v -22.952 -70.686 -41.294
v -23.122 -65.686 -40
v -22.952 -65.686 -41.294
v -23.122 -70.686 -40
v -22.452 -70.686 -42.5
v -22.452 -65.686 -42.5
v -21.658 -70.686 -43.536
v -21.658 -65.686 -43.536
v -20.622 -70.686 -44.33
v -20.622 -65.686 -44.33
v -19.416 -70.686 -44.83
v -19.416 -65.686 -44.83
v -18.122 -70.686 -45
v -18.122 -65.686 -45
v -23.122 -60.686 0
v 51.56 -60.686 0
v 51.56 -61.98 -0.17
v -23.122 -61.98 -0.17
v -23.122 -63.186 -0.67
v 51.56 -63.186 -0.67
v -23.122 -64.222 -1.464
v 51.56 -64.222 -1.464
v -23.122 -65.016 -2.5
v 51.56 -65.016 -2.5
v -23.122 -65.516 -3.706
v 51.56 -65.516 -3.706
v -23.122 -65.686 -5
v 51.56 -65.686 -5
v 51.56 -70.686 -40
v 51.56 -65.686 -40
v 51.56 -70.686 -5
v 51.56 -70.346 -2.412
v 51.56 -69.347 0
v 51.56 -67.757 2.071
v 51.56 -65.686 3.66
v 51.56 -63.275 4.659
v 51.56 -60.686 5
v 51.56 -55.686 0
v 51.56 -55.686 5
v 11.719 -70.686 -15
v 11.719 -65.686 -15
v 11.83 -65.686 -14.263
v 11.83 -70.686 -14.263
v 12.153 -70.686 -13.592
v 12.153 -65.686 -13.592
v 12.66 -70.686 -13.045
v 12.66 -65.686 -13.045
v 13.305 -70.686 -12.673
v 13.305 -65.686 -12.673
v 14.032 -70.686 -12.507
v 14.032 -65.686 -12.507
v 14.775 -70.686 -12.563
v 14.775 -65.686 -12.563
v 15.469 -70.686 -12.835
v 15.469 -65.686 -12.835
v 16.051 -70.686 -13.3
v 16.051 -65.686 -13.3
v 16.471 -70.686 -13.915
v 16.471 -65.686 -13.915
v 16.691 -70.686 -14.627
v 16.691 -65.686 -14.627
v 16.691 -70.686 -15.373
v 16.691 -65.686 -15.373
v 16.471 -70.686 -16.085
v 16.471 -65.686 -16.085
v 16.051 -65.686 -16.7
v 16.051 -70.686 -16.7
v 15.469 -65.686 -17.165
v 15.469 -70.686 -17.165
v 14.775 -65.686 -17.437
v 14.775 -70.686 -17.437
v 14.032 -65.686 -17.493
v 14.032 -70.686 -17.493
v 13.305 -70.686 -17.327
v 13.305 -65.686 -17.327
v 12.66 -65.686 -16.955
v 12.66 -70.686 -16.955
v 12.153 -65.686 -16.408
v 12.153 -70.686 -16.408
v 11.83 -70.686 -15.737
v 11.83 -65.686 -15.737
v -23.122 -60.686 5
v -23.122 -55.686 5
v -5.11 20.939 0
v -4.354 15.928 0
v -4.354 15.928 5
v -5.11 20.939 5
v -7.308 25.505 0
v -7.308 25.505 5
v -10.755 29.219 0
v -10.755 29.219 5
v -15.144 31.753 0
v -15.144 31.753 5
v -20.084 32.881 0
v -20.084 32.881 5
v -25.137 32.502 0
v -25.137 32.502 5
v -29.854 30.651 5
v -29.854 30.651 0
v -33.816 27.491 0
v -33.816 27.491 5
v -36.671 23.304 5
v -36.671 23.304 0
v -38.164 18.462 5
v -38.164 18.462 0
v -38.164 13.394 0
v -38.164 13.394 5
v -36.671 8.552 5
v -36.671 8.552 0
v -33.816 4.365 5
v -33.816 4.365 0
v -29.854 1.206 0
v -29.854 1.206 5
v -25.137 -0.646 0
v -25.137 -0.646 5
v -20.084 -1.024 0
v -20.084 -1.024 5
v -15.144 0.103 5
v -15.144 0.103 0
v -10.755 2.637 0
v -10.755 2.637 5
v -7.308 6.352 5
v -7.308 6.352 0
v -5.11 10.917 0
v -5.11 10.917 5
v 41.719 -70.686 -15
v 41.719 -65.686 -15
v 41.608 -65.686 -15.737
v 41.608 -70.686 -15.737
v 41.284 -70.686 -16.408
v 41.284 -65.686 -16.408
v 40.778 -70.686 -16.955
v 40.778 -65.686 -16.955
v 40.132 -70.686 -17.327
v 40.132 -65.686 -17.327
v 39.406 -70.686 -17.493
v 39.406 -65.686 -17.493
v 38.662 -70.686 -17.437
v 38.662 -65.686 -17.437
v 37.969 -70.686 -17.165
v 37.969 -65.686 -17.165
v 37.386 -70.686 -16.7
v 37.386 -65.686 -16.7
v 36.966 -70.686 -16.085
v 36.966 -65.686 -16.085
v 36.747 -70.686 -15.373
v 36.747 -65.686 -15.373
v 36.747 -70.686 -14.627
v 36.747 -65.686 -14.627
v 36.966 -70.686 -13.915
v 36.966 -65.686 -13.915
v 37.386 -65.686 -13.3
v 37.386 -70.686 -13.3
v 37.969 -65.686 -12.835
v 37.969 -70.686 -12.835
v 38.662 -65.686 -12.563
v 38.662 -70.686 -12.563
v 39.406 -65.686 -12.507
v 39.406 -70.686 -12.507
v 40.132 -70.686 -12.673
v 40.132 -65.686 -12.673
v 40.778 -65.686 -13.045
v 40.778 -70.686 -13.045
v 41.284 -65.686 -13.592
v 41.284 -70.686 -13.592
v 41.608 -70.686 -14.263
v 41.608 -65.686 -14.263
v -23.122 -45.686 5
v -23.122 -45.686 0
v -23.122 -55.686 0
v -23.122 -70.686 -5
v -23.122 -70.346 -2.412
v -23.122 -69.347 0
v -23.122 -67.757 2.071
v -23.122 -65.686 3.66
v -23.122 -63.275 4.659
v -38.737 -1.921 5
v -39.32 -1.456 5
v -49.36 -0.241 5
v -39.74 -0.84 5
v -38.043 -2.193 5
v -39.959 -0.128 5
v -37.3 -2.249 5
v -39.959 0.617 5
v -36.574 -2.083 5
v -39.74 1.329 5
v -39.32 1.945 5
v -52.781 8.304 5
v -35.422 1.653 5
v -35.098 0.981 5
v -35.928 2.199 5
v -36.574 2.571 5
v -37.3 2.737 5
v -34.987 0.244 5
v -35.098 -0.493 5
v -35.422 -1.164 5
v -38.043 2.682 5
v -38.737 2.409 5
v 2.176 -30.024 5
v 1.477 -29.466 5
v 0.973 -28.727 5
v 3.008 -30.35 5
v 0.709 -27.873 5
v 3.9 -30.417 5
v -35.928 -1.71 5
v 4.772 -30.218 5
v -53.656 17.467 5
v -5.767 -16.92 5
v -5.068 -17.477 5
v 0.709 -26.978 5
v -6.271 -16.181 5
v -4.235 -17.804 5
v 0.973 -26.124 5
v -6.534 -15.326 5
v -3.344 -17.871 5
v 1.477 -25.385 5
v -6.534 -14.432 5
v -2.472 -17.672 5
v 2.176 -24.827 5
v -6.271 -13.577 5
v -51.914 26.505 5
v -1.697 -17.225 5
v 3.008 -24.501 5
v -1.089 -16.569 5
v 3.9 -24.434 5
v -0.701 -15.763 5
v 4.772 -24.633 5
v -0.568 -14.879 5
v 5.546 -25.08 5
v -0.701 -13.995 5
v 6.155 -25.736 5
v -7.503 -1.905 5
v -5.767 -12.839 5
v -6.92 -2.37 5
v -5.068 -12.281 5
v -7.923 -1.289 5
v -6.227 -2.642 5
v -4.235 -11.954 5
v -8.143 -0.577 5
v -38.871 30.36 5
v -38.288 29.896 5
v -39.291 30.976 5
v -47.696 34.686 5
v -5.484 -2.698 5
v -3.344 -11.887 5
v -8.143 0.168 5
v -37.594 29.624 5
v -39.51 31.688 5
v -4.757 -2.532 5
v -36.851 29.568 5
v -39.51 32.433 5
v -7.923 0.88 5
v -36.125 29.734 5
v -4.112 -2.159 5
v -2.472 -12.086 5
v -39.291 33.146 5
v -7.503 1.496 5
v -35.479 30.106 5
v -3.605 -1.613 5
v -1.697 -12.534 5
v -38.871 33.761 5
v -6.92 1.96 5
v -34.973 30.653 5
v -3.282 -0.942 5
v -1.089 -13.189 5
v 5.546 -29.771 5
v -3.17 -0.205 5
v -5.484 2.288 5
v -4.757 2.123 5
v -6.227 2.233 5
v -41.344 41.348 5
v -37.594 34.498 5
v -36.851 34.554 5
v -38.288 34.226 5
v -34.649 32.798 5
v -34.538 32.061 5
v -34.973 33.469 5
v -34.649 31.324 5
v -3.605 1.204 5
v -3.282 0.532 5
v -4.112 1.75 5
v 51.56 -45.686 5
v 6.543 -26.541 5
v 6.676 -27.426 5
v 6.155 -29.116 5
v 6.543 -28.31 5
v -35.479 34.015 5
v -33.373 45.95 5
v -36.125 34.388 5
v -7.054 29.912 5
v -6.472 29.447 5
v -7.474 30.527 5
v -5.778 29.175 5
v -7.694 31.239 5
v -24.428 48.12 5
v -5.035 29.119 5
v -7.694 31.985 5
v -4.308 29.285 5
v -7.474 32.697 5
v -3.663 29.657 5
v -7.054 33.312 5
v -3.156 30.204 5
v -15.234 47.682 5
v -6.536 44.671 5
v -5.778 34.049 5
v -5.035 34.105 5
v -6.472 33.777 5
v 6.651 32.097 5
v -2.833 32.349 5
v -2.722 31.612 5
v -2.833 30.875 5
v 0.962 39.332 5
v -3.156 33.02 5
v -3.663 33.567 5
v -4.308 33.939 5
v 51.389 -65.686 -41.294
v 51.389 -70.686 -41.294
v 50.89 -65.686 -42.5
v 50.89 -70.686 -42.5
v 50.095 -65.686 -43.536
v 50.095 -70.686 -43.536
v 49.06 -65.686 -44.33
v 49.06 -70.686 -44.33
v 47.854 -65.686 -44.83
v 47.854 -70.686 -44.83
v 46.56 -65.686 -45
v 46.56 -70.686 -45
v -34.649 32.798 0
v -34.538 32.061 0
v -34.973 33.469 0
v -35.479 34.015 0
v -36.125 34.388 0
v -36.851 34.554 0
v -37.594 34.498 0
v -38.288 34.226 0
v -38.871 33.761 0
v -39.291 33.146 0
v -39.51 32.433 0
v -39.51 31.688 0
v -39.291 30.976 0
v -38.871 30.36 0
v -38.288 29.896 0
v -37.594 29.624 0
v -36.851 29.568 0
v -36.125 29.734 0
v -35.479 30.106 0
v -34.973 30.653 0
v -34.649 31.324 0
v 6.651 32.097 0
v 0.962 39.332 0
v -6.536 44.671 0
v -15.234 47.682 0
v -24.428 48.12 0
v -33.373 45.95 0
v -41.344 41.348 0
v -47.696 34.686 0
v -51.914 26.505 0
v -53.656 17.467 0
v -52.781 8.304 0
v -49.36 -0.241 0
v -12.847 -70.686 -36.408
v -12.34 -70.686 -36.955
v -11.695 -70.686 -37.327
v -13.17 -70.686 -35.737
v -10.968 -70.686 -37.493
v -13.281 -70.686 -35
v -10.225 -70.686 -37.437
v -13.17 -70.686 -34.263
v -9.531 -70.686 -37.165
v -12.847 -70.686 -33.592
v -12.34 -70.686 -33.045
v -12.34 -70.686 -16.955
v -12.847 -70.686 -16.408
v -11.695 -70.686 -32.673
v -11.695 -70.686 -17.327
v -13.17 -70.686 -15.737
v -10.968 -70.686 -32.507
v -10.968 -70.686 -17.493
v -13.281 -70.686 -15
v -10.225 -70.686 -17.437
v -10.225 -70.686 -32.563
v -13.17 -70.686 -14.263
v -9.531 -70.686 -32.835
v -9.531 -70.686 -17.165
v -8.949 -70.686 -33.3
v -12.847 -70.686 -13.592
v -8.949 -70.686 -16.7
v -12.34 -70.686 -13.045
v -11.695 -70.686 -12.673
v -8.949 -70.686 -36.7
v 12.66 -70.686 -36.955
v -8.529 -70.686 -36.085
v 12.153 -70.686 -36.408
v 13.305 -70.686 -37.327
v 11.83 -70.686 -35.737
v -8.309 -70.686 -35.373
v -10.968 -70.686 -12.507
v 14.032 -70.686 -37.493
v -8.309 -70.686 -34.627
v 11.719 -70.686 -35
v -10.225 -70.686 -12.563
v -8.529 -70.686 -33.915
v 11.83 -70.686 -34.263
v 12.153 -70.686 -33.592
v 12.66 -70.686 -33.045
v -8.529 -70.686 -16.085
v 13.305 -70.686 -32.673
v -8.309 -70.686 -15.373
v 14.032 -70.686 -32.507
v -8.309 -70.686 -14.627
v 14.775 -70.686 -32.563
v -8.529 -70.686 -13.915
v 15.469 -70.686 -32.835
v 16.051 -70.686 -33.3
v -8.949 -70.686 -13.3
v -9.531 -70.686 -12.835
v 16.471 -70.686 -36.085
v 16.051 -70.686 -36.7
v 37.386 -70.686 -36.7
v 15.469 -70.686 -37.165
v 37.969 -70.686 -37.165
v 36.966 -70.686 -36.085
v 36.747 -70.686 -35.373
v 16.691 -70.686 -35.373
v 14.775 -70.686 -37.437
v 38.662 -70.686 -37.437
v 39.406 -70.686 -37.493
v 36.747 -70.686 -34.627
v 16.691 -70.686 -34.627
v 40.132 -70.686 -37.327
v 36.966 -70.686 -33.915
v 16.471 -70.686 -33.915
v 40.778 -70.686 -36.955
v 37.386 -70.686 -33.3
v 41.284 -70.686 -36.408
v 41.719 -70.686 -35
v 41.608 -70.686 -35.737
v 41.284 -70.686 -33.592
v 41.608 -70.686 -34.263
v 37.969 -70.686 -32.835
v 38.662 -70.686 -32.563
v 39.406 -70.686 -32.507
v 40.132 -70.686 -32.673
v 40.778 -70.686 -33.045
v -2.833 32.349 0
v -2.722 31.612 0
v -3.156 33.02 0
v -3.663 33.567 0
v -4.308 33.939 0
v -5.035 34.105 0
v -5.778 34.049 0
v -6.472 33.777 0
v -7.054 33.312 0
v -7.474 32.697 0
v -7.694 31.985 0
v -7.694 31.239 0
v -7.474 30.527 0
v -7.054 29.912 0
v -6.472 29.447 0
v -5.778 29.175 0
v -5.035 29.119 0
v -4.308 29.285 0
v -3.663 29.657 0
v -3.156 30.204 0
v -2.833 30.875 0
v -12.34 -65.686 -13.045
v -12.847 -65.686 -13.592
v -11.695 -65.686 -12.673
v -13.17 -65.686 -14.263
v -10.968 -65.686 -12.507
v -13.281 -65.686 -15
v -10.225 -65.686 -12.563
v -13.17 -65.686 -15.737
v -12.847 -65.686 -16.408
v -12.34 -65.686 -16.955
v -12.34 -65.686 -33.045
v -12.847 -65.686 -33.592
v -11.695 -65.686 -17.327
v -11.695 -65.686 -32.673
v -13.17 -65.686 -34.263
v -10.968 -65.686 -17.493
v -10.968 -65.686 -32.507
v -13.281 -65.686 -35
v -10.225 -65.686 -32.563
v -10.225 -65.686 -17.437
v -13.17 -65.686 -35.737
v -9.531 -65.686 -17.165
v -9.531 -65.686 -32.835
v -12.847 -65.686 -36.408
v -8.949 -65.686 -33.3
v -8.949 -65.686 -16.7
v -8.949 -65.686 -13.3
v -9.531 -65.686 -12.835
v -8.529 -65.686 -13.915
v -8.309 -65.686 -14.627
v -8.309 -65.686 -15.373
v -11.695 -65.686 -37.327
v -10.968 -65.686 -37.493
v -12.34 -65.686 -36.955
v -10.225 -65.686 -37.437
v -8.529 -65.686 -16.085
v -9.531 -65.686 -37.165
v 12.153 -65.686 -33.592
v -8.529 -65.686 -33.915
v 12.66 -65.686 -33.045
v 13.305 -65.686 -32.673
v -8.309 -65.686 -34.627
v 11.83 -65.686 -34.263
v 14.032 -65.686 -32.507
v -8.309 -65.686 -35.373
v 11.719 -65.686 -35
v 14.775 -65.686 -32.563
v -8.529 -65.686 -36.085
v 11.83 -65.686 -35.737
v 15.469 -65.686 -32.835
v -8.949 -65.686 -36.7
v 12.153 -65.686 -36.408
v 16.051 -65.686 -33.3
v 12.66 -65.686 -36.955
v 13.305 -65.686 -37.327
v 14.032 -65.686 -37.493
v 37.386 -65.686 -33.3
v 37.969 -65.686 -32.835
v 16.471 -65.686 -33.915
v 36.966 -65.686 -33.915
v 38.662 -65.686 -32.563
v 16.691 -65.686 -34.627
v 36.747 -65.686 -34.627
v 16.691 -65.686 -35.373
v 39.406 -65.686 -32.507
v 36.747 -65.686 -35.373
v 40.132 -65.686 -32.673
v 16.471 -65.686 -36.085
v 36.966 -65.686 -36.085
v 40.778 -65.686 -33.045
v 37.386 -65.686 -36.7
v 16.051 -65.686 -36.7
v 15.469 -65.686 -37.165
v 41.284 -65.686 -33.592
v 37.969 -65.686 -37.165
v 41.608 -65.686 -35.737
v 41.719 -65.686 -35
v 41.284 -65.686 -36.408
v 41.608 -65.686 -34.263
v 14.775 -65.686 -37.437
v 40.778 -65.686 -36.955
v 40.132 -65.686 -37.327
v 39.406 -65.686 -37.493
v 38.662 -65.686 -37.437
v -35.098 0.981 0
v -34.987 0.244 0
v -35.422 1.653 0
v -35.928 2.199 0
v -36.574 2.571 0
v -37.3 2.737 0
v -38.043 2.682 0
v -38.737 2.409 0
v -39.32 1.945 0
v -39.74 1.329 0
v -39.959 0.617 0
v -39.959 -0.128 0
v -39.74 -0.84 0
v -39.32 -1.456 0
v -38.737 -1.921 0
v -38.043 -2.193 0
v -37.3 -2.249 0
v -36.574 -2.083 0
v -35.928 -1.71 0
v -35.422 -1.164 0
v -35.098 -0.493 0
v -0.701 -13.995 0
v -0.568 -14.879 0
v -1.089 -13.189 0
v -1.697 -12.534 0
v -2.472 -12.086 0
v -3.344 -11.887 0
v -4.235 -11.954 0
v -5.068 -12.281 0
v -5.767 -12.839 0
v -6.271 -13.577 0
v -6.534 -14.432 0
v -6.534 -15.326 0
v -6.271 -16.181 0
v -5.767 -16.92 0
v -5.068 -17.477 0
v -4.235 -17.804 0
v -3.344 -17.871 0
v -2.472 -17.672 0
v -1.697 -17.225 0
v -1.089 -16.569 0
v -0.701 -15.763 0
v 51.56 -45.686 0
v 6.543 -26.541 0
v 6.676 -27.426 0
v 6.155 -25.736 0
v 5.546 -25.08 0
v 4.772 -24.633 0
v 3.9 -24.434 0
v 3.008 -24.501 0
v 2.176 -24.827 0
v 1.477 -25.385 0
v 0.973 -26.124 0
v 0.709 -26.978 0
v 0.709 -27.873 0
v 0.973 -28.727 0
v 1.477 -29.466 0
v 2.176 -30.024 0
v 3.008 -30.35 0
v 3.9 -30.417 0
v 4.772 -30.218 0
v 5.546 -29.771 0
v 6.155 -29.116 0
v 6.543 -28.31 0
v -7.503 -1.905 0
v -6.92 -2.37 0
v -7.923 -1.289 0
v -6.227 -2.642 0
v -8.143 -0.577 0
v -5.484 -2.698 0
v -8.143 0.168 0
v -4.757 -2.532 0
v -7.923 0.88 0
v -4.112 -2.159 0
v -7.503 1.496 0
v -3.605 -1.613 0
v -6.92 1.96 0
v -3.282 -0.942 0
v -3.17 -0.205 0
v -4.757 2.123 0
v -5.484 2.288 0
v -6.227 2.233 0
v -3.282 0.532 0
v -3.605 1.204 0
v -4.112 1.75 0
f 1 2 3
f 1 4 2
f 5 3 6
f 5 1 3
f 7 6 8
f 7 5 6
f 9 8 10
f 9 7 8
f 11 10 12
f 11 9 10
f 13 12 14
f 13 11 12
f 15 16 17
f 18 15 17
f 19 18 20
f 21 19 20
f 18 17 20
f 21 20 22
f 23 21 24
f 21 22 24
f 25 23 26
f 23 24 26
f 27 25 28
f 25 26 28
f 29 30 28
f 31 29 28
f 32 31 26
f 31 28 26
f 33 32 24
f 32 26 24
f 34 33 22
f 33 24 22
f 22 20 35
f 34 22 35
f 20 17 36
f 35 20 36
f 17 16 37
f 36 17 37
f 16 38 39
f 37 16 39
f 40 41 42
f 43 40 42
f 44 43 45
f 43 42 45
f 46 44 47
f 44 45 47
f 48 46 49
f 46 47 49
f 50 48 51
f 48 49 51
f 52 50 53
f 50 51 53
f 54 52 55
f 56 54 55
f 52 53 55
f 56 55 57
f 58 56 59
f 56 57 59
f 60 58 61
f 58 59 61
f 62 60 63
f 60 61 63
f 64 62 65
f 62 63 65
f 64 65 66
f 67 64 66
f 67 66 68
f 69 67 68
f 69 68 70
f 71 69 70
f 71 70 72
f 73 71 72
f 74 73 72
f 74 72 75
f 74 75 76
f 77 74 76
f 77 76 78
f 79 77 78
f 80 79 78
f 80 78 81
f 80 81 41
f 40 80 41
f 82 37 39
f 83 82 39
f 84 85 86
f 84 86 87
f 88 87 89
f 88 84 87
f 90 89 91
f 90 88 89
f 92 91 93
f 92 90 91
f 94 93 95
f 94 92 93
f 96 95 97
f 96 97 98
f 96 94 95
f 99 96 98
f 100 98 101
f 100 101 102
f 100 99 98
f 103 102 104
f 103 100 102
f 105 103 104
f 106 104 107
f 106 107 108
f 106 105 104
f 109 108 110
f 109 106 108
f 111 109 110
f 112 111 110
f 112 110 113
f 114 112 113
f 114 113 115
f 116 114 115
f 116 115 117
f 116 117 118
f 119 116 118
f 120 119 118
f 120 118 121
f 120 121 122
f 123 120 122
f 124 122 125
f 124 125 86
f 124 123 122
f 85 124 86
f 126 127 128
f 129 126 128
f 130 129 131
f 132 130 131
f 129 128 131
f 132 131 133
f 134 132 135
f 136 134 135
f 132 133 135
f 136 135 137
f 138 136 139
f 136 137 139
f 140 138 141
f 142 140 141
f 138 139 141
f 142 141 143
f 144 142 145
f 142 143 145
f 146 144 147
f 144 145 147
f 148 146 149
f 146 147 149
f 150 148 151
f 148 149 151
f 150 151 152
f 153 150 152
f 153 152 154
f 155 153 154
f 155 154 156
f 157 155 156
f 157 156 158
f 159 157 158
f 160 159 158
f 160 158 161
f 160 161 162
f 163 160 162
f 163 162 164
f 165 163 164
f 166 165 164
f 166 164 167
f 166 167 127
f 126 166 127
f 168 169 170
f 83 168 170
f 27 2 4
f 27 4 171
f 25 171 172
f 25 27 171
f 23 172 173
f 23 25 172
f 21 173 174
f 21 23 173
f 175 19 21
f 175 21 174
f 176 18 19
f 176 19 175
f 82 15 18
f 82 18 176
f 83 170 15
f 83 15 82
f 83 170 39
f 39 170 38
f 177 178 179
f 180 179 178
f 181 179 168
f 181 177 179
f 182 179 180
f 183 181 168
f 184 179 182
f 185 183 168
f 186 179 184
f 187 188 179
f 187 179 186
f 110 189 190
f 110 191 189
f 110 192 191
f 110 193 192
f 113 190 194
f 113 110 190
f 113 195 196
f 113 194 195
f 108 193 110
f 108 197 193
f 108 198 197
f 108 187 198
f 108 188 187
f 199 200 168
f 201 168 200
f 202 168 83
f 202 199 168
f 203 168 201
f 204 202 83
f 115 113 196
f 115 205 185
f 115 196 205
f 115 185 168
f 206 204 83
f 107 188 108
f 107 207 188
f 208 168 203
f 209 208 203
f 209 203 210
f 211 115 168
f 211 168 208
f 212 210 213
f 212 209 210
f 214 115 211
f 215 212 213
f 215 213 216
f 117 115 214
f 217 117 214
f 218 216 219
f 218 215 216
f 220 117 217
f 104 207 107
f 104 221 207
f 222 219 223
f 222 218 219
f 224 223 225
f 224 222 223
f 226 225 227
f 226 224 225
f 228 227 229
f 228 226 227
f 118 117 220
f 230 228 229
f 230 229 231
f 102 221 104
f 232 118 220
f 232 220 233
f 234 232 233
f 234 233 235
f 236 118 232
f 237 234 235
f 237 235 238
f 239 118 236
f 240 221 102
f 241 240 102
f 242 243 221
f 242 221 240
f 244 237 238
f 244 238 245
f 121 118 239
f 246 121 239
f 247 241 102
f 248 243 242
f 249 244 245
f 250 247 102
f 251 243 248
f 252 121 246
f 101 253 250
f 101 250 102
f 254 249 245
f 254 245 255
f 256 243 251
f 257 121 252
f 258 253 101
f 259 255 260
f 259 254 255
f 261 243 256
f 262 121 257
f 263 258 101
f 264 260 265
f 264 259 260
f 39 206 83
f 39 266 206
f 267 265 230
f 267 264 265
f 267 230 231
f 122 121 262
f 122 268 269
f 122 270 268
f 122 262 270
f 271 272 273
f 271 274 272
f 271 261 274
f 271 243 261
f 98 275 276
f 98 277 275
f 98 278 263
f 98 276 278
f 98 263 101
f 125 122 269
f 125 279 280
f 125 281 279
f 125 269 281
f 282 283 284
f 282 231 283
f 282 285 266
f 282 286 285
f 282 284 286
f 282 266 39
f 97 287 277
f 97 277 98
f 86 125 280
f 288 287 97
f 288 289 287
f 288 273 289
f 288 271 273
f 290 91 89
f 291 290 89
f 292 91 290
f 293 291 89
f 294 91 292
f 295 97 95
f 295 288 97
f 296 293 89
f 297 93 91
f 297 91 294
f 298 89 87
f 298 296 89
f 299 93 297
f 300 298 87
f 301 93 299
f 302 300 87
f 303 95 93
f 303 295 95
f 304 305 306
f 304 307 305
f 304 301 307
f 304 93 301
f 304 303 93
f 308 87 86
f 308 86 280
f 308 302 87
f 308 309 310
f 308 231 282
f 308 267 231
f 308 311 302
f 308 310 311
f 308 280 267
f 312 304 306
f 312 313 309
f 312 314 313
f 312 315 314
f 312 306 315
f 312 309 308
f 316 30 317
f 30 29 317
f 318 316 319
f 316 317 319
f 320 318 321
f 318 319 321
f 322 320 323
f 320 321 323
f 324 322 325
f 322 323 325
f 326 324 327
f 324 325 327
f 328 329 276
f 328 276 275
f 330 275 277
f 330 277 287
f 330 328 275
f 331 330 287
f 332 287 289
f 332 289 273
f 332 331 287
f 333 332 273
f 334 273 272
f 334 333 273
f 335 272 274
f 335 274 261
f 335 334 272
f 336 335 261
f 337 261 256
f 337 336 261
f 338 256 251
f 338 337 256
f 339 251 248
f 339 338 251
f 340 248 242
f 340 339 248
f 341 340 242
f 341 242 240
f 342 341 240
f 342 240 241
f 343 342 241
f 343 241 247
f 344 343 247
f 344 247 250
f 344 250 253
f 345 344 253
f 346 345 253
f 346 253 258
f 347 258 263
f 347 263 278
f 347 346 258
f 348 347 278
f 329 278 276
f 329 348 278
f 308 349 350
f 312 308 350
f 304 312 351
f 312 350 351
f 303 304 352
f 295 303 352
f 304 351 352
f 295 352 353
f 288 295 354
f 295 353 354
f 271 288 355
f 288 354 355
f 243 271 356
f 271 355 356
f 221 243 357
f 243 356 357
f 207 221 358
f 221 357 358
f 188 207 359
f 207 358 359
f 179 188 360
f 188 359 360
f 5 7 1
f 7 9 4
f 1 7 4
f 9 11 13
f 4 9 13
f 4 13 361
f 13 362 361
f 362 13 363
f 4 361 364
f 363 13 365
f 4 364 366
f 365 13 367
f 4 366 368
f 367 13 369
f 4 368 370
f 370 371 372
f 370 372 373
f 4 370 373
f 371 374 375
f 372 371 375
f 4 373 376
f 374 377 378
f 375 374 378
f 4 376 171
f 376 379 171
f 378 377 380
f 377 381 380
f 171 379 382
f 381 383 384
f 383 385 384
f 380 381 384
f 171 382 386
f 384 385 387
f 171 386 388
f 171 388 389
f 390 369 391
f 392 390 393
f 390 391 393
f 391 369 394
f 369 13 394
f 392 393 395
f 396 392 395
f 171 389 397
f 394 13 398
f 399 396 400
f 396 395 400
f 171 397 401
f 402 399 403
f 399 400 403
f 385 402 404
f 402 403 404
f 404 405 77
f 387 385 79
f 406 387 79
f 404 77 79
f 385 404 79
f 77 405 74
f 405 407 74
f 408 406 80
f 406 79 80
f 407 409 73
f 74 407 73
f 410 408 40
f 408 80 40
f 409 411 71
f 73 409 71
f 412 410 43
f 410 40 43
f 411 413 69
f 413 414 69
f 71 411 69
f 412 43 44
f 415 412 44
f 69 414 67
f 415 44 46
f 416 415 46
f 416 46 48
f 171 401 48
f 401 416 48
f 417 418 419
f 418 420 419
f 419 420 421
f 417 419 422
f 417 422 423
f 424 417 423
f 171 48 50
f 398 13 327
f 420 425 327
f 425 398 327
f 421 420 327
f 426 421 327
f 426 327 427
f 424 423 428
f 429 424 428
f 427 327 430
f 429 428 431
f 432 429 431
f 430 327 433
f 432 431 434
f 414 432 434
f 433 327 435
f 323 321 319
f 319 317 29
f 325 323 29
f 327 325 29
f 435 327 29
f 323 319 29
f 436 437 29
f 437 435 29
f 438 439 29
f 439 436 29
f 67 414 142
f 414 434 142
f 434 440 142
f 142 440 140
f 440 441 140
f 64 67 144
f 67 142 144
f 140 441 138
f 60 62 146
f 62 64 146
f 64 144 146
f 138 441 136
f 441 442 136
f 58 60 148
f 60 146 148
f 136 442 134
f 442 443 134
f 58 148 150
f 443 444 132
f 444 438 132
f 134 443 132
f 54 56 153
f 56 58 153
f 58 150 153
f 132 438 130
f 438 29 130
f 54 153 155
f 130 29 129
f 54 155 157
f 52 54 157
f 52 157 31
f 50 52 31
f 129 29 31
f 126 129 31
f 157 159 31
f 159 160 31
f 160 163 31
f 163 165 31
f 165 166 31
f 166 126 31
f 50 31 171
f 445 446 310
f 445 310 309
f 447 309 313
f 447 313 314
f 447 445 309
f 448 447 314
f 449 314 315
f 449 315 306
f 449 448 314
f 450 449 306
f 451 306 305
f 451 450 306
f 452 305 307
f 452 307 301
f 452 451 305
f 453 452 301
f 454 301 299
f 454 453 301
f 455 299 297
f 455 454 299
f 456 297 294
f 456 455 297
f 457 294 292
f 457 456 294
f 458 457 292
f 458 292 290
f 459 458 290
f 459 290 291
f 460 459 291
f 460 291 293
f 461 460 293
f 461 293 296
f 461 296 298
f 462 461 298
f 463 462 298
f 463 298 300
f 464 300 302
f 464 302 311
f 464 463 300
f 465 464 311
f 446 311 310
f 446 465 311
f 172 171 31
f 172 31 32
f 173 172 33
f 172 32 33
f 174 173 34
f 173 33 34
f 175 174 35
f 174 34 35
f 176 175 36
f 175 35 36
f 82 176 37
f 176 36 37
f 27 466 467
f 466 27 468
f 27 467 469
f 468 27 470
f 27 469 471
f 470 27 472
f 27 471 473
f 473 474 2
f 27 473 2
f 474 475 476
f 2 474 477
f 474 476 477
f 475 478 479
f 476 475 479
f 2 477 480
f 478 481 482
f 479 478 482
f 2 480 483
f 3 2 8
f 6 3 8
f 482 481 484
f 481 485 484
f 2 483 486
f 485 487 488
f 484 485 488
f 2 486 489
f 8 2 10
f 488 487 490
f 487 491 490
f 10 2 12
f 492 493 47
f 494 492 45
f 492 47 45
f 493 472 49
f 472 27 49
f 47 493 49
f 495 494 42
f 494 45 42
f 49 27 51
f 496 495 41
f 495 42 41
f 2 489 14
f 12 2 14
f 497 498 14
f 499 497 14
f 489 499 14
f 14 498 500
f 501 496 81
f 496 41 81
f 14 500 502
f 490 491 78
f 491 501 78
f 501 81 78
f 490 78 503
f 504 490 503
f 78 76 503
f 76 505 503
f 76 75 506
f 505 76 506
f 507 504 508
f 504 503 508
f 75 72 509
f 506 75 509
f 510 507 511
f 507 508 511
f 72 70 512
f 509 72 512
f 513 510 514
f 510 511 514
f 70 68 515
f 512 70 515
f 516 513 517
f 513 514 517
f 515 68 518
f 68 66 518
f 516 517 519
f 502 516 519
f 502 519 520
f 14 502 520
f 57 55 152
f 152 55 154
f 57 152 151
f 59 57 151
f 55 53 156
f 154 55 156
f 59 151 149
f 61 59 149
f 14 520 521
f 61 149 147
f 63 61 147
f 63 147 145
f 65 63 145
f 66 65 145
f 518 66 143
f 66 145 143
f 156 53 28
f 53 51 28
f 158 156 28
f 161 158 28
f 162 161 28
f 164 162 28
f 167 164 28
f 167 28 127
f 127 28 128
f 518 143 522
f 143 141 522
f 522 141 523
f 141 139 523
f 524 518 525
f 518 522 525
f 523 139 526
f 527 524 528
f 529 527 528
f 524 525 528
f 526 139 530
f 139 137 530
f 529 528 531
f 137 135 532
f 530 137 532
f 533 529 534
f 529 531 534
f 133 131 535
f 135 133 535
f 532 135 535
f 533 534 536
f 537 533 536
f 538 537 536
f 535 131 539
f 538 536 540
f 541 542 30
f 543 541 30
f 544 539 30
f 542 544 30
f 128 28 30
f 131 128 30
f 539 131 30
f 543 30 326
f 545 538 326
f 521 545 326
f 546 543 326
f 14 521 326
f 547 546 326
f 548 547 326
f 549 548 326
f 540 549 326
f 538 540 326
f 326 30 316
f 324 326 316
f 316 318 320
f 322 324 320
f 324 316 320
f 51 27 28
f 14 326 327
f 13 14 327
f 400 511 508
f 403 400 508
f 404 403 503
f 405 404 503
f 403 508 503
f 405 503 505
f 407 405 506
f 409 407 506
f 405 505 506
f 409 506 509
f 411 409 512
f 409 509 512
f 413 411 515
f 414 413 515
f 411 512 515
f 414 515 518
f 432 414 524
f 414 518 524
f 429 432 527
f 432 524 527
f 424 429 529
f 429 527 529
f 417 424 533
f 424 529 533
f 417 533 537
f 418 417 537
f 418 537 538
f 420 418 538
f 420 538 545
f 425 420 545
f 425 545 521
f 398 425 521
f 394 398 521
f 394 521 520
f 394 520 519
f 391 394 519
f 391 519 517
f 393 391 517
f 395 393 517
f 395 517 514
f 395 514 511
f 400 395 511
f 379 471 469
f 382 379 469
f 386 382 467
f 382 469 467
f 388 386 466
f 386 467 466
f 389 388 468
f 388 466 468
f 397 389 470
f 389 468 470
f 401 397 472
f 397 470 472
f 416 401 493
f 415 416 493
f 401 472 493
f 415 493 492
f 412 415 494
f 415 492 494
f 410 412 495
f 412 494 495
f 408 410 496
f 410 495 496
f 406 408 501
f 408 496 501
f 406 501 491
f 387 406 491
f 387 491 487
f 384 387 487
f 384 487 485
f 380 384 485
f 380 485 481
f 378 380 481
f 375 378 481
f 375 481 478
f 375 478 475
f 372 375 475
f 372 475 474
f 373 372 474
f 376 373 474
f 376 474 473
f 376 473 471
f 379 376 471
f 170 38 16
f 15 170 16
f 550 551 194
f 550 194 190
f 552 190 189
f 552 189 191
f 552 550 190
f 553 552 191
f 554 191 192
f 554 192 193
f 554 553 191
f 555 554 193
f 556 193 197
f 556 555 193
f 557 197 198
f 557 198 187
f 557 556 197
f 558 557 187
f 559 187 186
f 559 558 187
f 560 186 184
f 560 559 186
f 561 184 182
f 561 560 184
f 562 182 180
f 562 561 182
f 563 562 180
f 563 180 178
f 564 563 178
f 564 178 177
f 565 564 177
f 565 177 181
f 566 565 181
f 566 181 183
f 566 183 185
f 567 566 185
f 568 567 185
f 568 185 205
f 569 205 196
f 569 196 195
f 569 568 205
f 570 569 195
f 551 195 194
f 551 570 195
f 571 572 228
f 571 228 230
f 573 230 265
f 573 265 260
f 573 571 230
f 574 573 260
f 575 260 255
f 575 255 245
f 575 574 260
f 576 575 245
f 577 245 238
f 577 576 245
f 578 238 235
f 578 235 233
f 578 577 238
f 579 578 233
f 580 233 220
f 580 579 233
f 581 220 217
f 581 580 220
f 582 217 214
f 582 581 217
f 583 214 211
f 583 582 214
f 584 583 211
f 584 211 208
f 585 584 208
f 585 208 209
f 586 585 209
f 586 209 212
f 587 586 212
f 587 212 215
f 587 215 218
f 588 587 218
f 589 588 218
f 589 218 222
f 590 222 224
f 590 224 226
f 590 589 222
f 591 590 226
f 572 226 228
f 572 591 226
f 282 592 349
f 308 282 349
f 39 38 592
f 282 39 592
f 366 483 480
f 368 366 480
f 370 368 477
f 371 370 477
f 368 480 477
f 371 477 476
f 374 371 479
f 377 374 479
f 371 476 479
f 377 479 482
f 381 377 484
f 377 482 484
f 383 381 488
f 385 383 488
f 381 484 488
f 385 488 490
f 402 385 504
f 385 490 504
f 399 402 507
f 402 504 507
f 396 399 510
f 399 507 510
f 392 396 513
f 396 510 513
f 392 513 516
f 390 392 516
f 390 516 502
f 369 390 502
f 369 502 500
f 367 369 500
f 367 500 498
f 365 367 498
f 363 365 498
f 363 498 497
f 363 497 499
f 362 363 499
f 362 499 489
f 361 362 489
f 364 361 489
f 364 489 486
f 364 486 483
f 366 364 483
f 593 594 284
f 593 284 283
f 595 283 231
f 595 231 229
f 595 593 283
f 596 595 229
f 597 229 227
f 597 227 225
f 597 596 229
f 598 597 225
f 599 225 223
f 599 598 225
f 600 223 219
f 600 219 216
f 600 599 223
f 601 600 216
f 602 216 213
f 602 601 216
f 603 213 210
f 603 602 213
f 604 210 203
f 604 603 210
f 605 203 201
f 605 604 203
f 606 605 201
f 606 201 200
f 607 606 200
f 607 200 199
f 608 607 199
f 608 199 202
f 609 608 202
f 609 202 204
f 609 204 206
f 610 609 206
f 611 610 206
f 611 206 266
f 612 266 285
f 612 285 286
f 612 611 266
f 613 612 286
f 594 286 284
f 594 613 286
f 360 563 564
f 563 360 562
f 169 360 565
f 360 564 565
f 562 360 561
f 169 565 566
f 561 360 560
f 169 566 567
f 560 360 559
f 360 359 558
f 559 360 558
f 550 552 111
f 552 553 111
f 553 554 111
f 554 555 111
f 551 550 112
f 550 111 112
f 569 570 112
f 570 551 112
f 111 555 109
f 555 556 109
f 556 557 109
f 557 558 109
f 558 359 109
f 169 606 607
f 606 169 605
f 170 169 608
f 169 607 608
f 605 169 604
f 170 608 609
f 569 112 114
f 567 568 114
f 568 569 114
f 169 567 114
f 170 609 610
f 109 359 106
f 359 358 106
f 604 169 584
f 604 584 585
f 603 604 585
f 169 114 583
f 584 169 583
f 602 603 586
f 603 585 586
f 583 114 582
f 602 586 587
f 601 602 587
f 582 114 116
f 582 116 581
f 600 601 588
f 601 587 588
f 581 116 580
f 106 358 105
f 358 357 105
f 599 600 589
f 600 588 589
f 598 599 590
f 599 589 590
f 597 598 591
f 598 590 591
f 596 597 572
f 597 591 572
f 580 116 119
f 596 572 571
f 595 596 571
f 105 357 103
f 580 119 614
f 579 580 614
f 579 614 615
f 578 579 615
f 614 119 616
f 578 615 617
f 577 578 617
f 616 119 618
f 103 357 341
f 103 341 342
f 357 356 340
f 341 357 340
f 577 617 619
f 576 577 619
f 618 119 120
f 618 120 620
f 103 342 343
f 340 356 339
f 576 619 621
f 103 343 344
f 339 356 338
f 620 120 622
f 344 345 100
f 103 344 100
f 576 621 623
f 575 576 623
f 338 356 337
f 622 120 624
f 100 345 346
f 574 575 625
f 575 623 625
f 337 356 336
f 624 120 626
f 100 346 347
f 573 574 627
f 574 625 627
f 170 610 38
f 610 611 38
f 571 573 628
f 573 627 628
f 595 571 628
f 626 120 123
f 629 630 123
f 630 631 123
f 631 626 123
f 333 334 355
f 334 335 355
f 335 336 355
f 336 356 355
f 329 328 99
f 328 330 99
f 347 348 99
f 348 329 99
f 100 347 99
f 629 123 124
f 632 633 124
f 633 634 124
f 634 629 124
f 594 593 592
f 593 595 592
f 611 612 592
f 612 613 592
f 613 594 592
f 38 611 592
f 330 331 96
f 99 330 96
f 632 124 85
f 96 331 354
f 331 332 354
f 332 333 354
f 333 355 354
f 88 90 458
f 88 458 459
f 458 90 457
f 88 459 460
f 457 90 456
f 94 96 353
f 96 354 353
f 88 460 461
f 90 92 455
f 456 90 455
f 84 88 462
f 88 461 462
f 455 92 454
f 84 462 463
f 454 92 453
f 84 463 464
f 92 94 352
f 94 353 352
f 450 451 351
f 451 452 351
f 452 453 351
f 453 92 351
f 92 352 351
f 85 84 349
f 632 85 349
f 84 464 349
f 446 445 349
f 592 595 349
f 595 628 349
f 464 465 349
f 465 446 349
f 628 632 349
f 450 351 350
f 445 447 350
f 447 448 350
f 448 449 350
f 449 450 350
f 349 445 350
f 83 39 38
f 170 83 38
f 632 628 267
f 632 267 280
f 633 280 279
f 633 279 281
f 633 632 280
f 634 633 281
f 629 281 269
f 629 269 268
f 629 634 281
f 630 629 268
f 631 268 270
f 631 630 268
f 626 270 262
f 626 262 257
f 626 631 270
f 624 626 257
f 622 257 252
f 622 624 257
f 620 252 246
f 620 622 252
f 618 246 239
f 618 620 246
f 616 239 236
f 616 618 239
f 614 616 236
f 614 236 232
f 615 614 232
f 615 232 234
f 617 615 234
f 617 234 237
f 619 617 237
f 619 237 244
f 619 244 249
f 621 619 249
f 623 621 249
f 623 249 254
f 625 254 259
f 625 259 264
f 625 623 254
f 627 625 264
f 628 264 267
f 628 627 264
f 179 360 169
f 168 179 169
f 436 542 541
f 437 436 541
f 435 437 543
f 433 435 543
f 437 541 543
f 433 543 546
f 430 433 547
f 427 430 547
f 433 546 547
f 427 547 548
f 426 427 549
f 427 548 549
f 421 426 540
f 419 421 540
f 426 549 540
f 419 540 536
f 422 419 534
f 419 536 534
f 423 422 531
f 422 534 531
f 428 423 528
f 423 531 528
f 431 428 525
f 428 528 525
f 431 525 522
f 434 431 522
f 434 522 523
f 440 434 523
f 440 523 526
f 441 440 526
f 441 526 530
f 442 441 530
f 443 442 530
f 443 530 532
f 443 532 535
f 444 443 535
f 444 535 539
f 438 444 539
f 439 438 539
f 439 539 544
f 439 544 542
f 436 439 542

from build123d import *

# Parameters (mm, degrees)
SKETCH_1_R             = 17
SKETCH_1_R_2           = 2.5
SKETCH_1_R_3           = 3
EXTRUDE_1_DEPTH        = 5
SM_BASE_FLANGE_1_DEPTH = 74.681955
SKETCH_8_R             = 2.5
CUT_EXTRUDE_1_DEPTH    = 134.765093758
FILLET_1_R             = 5


# Sheet-metal steps are written as plain solids
with BuildPart() as part:
    # Sketch 1 → 凸台-拉伸1 (new body)
    with BuildSketch(Plane.XY):
        with BuildLine():
            Line((-49.360062144, -0.241015089), (-23.122201524, -45.686322765))
            Line((-23.122201524, -45.686322765), (-23.122201524, -55.686322765))
            Line((-23.122201524, -55.686322765), (51.559753885, -55.686322765))
            Line((51.559753885, -55.686322765), (51.559753885, -45.686322765))
            Line((51.559753885, -45.686322765), (6.651404412, 32.097220205))
            ThreePointArc((6.651404412, 32.097220205), (-37.523446513, 43.933835837), (-49.360062144, -0.241015089))
        make_face()
        with Locations((-21.354328866, 15.928102558)):
            Circle(SKETCH_1_R, mode=Mode.SUBTRACT)
        with Locations((-37.038190861, 32.060878913)):
            Circle(SKETCH_1_R_2, mode=Mode.SUBTRACT)
        with Locations((-3.567776343, -14.879110103)):
            Circle(SKETCH_1_R_3, mode=Mode.SUBTRACT)
        with Locations((3.675910259, -27.425543331)):
            Circle(SKETCH_1_R_3, mode=Mode.SUBTRACT)
        with Locations((-5.221552511, 31.611964554)):
            Circle(SKETCH_1_R_2, mode=Mode.SUBTRACT)
        with Locations((-5.670466871, -0.204673796)):
            Circle(SKETCH_1_R_2, mode=Mode.SUBTRACT)
        with Locations((-37.487105221, 0.244240563)):
            Circle(SKETCH_1_R_2, mode=Mode.SUBTRACT)
    extrude(amount=EXTRUDE_1_DEPTH)


with BuildPart() as body_2:
    # 草图3 → 基体-法兰1 (new body)
    with BuildSketch(Plane(origin=(51.559753885, 0, 0), x_dir=(0, 0, -1), z_dir=(1, 0, 0))):
        with BuildLine():
            Line((0, -55.686322765), (0, -60.686322765))
            ThreePointArc((0, -60.686322765), (1.464466094, -64.221856671), (5, -65.686322765))
            Line((5, -65.686322765), (45, -65.686322765))
            Line((45, -65.686322765), (45, -70.686322765))
            Line((45, -70.686322765), (5, -70.686322765))
            ThreePointArc((5, -70.686322765), (-2.071067812, -67.757390577), (-5, -60.686322765))
            Line((-5, -60.686322765), (-5, -55.686322765))
            Line((-5, -55.686322765), (0, -55.686322765))
        make_face()
    extrude(amount=-SM_BASE_FLANGE_1_DEPTH)

    # 草图8 → 切除-拉伸1 (cut, through all)
    with BuildSketch(Plane(origin=(0, -65.686322765, 0), x_dir=(1, 0, 0), z_dir=(0, 1, 0))):
        with Locations(Location((14.21877618, 35, 0), (0, 0, 180))):
            Circle(SKETCH_8_R)
        with Locations(Location((-10.78122382, 35, 0), (0, 0, 180))):
            Circle(SKETCH_8_R)
        with Locations(Location((-10.78122382, 15, 0), (0, 0, 180))):
            Circle(SKETCH_8_R)
        with Locations(Location((14.21877618, 15, 0), (0, 0, 180))):
            Circle(SKETCH_8_R)
        with Locations((39.21877618, 15)):
            Circle(SKETCH_8_R)
        with Locations((39.21877618, 35)):
            Circle(SKETCH_8_R)
    extrude(amount=-CUT_EXTRUDE_1_DEPTH, mode=Mode.SUBTRACT)

    # 圆角1
    fillet_1_edges = [body_2.edges().sort_by_distance(p)[0] for p in [
        (-23.122201115, -68.186322765, -45),
        (51.559753885, -68.186322765, -45),
    ]]
    fillet(fillet_1_edges, radius=FILLET_1_R)


solid = Compound([part.part, body_2.part])
